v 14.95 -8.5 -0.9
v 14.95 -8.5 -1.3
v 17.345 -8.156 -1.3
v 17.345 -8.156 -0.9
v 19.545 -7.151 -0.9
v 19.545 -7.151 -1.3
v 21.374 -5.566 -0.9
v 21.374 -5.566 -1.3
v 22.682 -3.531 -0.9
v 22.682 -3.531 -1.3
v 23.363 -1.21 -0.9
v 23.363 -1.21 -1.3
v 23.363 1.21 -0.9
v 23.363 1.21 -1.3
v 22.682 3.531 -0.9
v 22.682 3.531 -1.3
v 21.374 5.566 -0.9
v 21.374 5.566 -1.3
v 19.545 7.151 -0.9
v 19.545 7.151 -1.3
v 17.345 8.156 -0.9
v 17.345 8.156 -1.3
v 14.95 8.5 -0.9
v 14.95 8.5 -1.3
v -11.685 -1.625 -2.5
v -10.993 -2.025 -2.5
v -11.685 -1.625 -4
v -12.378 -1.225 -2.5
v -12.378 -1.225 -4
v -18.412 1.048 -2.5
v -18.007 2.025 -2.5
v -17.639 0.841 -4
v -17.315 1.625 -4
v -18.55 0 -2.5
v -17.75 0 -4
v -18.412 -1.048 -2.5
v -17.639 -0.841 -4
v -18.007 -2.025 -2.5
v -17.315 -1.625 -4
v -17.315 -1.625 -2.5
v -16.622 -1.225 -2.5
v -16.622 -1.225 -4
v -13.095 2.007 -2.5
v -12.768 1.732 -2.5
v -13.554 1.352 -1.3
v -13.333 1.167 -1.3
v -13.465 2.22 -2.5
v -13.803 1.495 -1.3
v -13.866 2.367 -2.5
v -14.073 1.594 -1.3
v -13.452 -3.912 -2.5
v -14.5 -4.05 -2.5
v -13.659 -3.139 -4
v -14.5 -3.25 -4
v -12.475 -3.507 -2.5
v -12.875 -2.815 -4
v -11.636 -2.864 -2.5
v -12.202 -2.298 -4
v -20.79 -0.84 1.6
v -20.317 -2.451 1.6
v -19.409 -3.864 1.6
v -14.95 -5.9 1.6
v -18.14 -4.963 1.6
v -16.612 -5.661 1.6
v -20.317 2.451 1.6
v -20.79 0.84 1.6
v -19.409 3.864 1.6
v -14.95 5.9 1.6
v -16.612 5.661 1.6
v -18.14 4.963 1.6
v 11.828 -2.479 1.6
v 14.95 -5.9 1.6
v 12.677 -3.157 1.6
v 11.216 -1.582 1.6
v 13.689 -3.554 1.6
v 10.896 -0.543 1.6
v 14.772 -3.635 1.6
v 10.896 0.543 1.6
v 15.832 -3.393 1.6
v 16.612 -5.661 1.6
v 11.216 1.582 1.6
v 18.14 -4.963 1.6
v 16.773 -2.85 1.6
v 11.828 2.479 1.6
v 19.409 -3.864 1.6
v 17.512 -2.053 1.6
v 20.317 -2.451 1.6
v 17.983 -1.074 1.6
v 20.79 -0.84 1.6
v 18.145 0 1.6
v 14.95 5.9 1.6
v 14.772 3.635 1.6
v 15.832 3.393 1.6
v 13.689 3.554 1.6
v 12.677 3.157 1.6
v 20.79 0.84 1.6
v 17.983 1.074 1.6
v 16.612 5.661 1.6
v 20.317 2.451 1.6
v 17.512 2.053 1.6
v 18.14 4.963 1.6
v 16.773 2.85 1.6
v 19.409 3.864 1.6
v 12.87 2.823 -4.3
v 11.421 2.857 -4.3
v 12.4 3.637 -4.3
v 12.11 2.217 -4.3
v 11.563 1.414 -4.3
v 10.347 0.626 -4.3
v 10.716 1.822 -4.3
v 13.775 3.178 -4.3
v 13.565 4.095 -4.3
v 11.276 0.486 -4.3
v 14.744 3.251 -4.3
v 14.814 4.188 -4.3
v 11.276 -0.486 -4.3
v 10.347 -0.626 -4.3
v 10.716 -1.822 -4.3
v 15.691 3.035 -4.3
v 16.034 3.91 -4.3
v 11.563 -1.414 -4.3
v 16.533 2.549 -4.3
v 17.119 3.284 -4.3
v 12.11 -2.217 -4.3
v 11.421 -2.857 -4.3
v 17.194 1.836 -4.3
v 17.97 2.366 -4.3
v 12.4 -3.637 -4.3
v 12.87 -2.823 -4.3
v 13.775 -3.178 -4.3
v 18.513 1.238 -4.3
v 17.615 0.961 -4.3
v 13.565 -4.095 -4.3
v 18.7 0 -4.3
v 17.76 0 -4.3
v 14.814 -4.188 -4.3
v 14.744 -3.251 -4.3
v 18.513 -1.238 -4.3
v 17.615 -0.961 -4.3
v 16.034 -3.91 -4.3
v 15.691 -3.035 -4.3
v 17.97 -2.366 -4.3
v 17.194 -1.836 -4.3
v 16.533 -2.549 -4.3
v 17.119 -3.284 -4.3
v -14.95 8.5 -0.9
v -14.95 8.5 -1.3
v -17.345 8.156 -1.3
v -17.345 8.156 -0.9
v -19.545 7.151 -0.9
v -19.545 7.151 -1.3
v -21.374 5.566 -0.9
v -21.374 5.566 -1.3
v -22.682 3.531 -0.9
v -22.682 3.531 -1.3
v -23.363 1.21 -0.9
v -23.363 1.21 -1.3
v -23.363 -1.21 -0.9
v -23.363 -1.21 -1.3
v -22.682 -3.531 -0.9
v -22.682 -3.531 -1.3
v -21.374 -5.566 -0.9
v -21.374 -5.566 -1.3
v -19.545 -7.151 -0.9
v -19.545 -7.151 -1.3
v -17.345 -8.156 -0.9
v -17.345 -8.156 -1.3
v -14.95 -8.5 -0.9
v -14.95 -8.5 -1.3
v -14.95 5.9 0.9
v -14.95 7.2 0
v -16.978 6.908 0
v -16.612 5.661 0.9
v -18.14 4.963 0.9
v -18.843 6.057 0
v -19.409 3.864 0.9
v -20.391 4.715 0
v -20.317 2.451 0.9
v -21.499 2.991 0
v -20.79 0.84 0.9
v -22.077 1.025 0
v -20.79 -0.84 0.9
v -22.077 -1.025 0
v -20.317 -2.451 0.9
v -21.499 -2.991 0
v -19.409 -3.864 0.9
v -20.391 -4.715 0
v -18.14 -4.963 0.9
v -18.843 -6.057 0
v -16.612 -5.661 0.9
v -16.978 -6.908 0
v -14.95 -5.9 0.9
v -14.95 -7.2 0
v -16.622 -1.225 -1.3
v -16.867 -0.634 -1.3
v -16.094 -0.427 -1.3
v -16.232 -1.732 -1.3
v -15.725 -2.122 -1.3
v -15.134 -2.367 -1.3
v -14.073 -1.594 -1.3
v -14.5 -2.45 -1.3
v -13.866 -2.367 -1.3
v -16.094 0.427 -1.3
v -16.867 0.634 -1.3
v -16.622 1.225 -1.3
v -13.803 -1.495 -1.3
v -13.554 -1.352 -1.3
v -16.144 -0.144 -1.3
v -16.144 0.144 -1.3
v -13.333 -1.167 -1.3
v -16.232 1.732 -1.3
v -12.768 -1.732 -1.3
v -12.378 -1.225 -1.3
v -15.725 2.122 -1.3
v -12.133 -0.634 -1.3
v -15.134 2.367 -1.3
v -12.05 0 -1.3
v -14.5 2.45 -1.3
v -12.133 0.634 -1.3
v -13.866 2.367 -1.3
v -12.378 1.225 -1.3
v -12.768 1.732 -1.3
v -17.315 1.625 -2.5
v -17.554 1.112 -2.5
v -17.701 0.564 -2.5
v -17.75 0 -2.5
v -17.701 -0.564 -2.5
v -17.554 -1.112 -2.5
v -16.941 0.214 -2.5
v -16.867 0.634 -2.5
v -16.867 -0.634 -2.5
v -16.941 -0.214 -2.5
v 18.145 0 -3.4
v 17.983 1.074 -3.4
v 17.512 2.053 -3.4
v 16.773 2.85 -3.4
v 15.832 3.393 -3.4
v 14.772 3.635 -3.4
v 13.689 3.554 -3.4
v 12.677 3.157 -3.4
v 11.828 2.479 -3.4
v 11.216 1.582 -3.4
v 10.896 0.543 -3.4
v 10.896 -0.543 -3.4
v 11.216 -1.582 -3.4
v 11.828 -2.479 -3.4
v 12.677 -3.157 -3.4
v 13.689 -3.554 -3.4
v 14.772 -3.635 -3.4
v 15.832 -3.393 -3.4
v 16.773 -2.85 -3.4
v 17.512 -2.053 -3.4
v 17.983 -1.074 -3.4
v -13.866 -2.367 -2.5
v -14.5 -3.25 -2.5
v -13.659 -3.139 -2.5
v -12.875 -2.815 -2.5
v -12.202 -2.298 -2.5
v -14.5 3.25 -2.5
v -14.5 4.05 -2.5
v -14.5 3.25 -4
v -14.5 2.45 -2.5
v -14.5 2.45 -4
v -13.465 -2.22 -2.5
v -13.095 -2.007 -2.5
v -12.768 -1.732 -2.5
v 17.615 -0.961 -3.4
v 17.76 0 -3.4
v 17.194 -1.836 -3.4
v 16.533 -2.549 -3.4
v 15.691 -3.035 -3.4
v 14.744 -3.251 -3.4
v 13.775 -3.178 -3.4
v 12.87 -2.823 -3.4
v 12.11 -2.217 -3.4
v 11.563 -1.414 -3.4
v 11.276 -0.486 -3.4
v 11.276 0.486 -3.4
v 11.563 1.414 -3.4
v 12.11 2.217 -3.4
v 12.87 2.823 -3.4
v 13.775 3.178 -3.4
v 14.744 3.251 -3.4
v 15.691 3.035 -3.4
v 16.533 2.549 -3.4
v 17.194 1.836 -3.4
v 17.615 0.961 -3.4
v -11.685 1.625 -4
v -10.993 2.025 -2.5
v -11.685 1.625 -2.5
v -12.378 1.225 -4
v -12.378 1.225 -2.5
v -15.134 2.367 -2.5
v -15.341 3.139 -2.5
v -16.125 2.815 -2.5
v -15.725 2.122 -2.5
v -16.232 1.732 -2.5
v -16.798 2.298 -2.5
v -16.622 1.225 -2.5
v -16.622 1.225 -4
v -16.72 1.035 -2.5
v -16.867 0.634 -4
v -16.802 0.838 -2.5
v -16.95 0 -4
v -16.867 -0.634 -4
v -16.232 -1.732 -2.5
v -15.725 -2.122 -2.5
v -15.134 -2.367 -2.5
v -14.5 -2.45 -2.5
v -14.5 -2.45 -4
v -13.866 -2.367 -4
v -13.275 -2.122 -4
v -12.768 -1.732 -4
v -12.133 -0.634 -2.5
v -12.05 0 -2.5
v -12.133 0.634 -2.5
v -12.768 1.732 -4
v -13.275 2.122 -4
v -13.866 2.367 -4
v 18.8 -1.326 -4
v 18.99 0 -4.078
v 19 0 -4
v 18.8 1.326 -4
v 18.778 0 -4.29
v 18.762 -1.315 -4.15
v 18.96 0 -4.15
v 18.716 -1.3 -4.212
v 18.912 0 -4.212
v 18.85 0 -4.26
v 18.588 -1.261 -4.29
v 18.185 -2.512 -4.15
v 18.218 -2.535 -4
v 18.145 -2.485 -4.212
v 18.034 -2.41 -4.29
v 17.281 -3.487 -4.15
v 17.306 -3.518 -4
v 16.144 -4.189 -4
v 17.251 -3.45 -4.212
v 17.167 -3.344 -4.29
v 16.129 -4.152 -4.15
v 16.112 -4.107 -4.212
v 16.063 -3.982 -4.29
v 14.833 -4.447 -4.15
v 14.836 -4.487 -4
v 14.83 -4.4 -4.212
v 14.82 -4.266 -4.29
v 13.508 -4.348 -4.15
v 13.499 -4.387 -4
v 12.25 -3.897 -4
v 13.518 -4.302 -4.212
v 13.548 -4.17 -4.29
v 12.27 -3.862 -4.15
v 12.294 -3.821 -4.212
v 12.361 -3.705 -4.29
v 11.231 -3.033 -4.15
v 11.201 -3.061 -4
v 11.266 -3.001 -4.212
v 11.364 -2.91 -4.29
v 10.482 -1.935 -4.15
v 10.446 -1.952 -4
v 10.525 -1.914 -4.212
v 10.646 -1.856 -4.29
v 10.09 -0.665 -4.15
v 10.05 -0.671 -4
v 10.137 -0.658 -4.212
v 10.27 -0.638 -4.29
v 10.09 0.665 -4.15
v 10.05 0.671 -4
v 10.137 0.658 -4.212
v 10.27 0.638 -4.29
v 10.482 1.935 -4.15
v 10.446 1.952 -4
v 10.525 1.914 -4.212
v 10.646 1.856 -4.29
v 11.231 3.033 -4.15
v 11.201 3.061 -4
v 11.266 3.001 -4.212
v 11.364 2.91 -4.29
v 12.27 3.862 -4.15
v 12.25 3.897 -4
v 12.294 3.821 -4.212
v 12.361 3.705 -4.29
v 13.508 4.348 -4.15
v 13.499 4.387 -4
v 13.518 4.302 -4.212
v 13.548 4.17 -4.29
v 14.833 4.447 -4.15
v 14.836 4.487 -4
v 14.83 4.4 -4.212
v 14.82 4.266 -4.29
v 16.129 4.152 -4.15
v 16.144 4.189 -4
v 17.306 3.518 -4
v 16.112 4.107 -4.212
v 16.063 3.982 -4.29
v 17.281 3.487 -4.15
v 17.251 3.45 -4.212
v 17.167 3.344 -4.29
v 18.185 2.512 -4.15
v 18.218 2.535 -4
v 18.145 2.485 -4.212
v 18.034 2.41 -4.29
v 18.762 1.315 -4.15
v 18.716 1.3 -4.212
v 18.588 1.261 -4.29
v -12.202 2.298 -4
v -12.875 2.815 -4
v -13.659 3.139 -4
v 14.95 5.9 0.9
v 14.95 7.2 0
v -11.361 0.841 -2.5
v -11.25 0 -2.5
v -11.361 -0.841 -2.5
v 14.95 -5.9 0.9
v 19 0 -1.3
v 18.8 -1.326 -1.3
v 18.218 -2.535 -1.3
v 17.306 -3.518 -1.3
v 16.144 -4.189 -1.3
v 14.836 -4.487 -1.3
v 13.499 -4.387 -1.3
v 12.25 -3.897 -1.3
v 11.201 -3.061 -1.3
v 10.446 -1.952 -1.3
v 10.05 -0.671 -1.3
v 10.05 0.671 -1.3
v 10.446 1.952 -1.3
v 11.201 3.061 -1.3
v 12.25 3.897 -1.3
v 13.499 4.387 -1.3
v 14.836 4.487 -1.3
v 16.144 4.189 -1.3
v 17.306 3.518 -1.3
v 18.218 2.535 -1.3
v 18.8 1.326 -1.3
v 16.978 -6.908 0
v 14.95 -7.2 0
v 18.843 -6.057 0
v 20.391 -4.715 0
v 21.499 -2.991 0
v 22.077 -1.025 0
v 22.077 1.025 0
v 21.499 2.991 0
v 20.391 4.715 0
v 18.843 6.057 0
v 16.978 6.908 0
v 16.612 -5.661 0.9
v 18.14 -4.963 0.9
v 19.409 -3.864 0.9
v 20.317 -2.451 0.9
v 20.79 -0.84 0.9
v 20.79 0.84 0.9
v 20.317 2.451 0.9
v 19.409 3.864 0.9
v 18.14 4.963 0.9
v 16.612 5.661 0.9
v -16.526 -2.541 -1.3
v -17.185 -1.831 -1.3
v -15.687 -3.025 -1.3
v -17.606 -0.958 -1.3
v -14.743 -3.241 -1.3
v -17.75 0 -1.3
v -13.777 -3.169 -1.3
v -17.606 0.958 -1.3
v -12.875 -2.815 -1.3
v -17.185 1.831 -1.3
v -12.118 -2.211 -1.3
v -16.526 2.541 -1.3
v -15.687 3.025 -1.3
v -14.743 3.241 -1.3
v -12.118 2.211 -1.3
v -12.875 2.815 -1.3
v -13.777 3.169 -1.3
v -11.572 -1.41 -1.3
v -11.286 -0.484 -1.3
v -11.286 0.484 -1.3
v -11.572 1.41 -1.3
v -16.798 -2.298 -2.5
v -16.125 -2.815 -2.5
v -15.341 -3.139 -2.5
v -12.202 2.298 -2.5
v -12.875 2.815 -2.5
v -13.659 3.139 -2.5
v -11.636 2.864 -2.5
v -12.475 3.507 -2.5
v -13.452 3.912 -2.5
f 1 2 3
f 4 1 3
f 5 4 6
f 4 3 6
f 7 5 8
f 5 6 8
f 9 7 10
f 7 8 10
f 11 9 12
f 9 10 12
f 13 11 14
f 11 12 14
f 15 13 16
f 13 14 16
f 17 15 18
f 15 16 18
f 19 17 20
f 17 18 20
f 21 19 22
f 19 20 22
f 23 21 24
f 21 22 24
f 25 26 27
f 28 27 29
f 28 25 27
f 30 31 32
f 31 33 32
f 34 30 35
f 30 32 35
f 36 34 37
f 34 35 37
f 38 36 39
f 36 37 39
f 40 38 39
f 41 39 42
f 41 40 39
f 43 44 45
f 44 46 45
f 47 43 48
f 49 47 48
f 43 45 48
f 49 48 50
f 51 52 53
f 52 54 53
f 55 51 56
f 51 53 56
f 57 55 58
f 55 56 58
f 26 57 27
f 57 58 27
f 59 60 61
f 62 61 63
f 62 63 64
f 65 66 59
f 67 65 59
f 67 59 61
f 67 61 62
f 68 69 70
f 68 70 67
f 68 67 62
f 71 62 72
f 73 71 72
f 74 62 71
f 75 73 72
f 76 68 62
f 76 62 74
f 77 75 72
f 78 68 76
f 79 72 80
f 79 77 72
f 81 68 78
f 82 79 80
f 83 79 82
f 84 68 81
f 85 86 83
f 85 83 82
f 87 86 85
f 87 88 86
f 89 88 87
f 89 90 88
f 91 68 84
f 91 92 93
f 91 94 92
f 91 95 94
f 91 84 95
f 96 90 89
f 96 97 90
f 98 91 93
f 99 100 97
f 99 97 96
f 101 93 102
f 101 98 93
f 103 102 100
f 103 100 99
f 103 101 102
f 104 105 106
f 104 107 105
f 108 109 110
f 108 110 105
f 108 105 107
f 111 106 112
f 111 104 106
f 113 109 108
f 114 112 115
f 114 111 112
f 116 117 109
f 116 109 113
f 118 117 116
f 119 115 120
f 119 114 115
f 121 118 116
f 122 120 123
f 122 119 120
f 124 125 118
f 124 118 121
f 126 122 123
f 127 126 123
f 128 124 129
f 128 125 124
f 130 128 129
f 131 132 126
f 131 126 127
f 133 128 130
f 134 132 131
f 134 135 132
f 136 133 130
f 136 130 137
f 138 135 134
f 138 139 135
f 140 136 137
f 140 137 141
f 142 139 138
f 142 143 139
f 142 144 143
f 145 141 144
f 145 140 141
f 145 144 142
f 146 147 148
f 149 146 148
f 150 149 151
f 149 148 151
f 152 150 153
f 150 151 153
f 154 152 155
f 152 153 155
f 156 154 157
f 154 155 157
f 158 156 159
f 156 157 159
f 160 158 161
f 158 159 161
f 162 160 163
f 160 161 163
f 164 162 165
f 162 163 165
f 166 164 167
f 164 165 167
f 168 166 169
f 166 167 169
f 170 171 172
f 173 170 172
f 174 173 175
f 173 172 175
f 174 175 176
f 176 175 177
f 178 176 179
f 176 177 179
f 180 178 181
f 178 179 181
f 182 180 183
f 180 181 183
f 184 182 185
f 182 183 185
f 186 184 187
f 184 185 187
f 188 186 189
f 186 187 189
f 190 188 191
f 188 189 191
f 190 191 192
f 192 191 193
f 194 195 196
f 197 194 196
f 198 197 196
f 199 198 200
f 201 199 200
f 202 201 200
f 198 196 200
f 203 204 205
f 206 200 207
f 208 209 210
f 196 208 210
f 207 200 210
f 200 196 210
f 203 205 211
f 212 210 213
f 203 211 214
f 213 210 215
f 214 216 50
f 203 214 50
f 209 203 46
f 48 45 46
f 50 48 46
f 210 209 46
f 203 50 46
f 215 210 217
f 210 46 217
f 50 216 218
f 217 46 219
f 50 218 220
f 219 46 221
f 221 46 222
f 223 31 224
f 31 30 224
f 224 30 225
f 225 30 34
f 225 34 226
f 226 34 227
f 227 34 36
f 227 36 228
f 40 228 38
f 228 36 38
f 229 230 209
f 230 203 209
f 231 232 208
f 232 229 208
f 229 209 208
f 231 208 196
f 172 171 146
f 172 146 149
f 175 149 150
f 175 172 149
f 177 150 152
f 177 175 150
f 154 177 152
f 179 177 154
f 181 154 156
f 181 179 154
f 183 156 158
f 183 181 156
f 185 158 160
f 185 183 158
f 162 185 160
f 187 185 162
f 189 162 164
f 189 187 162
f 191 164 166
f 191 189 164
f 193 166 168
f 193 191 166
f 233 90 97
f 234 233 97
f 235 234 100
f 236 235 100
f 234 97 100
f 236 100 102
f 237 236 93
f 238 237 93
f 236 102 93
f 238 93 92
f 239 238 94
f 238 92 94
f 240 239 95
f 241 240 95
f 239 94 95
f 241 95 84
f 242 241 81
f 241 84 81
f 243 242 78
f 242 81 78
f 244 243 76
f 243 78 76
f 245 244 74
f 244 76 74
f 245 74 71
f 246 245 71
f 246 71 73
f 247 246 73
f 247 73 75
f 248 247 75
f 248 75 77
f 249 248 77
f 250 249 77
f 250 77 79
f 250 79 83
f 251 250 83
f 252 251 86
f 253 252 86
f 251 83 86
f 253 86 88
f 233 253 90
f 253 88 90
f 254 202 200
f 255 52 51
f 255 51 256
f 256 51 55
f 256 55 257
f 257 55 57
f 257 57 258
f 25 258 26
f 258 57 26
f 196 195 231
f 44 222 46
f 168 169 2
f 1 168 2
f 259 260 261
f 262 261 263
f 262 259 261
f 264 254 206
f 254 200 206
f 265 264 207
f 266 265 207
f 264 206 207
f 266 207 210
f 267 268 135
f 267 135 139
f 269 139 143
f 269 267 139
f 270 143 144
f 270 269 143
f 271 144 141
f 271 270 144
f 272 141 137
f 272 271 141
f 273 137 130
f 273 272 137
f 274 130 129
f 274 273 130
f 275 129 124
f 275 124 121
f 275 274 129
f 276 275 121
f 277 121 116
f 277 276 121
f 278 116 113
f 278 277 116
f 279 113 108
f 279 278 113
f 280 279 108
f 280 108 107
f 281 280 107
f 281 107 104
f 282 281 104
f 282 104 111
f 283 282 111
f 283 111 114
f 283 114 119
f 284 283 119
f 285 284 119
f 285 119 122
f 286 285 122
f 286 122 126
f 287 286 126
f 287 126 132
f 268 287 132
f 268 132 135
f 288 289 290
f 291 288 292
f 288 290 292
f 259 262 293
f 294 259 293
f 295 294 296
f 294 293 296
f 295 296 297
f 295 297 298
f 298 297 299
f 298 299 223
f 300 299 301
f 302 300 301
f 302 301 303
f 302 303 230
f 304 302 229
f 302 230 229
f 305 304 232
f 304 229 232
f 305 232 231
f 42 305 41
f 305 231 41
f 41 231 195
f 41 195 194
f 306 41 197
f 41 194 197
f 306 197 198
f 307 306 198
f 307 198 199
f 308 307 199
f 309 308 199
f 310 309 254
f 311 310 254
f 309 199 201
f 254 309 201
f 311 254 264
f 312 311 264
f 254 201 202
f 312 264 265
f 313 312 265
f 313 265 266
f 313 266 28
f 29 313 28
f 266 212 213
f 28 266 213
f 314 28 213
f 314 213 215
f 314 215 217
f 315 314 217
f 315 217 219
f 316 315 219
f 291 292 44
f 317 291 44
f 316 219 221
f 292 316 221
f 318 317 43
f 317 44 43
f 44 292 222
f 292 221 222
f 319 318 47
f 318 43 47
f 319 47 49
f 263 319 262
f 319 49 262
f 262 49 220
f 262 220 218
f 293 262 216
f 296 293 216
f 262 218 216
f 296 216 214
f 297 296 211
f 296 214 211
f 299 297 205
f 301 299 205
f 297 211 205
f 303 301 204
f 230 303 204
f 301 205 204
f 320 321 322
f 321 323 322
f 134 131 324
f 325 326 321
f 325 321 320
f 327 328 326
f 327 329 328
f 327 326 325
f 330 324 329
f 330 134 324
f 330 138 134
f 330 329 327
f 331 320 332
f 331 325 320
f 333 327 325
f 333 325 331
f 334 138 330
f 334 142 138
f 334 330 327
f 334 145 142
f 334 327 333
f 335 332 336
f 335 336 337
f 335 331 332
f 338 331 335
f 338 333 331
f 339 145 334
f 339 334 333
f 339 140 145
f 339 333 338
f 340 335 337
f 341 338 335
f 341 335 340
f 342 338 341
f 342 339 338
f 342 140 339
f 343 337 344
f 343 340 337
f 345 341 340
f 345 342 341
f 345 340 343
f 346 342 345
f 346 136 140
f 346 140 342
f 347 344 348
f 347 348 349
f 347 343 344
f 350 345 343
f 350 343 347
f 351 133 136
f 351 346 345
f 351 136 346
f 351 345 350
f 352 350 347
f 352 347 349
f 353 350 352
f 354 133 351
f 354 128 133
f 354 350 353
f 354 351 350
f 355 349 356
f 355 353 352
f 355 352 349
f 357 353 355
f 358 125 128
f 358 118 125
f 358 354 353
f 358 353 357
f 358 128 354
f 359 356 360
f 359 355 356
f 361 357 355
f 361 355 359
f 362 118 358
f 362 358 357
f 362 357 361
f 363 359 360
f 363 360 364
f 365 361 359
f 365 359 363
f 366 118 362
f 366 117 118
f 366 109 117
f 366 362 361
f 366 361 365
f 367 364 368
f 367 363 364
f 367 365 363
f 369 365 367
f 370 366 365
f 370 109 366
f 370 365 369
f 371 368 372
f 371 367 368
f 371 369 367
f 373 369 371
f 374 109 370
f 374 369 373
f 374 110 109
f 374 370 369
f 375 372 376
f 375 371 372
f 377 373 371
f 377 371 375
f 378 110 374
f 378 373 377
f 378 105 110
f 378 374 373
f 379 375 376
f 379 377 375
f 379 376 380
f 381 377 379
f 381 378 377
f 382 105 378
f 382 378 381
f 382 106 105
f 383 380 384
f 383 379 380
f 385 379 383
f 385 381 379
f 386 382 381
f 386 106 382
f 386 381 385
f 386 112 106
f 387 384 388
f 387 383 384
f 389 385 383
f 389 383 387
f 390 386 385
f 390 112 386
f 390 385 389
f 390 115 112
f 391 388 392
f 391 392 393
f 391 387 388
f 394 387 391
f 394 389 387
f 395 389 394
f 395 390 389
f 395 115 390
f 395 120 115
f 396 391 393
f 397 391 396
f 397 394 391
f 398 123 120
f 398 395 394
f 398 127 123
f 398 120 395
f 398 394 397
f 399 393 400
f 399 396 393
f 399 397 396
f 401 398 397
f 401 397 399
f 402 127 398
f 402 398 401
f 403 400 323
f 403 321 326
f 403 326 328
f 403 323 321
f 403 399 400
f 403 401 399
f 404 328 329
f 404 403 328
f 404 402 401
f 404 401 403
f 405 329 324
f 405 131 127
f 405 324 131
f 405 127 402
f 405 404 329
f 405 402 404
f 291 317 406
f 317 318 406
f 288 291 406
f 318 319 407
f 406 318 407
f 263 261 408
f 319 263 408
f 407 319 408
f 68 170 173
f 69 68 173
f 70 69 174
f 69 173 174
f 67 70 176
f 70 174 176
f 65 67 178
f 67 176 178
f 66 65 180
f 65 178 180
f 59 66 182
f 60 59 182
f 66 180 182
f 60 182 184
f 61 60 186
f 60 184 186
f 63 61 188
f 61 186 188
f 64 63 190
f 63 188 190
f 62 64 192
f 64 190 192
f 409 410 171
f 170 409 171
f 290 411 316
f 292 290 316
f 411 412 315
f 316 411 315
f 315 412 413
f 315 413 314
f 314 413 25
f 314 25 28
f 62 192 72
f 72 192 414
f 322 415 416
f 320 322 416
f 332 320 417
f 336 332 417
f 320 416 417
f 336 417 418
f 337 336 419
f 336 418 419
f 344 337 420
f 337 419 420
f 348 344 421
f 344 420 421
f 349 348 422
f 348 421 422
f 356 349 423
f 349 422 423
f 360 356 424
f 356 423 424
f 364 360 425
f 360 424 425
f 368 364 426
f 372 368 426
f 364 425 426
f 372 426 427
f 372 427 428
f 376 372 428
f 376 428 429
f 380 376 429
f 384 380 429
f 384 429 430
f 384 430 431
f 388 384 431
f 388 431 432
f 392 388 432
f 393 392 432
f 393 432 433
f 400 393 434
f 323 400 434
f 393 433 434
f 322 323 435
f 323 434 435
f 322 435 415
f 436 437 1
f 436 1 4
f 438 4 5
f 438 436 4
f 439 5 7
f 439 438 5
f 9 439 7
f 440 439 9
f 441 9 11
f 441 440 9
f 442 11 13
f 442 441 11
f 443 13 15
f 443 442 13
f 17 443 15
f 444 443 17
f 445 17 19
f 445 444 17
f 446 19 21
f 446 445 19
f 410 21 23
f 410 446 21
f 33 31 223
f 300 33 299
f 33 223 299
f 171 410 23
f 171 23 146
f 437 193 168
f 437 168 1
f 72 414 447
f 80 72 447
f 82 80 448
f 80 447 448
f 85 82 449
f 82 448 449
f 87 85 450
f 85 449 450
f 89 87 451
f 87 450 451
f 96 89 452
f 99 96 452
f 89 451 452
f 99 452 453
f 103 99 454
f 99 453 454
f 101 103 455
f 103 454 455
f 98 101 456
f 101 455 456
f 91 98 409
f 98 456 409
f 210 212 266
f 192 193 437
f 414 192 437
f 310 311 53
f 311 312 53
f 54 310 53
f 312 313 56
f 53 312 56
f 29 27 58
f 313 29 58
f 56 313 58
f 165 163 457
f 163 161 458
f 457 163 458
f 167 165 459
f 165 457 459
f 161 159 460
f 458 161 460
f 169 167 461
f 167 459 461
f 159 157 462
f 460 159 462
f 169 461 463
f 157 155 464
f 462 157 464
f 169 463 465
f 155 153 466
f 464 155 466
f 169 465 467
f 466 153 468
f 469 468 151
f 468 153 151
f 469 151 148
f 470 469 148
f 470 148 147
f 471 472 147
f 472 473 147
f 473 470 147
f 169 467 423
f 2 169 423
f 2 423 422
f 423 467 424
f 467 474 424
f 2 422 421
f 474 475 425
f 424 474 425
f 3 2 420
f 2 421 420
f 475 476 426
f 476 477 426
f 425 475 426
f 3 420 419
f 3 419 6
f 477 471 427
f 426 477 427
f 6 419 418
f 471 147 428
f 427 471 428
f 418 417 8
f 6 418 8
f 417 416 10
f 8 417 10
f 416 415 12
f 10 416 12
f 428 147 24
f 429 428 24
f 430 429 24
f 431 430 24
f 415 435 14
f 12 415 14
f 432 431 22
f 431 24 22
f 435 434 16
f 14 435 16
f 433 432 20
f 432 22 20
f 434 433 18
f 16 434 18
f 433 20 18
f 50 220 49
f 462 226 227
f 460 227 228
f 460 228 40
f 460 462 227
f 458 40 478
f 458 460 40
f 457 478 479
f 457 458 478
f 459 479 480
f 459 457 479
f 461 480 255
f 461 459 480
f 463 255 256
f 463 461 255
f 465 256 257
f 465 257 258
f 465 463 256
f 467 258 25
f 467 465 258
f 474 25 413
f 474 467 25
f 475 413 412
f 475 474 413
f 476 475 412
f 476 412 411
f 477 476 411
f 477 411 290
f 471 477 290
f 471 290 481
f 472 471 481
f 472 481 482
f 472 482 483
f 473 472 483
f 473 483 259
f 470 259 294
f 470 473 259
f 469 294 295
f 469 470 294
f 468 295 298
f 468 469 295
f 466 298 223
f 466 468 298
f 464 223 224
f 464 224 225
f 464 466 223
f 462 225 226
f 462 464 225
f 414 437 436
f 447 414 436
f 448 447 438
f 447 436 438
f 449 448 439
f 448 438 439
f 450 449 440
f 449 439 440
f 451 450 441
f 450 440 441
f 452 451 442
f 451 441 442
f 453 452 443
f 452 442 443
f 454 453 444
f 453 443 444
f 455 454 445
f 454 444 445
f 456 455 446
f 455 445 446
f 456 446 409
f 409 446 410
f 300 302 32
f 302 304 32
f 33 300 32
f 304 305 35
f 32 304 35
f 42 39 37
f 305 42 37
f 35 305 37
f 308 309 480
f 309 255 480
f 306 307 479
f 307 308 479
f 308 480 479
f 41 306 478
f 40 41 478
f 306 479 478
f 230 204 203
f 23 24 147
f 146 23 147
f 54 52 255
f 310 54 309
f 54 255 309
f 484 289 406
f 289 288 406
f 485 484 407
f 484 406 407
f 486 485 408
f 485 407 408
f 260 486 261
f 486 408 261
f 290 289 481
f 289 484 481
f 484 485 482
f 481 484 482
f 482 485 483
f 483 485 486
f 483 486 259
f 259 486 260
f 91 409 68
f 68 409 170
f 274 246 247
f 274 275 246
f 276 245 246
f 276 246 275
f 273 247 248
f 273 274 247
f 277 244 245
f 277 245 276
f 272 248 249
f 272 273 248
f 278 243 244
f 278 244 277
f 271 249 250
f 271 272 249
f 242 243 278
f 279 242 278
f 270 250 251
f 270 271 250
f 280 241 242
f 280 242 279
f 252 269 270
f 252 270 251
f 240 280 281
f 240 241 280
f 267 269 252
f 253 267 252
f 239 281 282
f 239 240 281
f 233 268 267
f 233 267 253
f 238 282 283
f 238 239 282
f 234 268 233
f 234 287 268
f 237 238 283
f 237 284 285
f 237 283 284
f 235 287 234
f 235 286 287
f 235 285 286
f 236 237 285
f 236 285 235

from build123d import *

# Parameters (mm, degrees)
F1_DEPTH         = 1.6
F4_DEPTH         = 1.3
F5_SIZE2         = 1.3
F5_SIZE          = 0.9
F5_2_SIZE2       = 1.29999
F5_2_SIZE        = 0.89999
F6_R             = 4.5
F6_R_2           = 3.26
F7_DEPTH         = 3
F8_DEPTH         = 2.901
F9_R             = 3.645
F9_R_2           = 3.26
F10_DEPTH        = 5
F11_W            = 0.8
F11_H            = 1.2
F13_ANGLE_BACK   = 30
F13_ANGLE        = 60
F13_COPIES_COUNT = 3
F14_ANGLE_BACK   = 15
F14_ANGLE        = 30
F14_COPIES_COUNT = 3
F15_R            = 0.3


# Not quite as in the source:
# - a fillet or chamfer is up to 0.001 mm smaller than in the source, because OpenCascade refuses the exact size
# - after a boolean that leaves OpenCascade's solid faulty, fix() repairs it
# - a pattern or mirror of a feature is missing from the dataset's text; its kind, count and spacing are read off the source's solid


with BuildPart() as f1:
    # F0 (on Top) → F1 (new body)
    with BuildSketch(Plane.XY):
        with BuildLine():
            Line((14.95, 5.9), (-14.95, 5.9))
            ThreePointArc((-14.95, 5.9), (-20.85, 0), (-14.95, -5.9))
            Line((-14.95, -5.9), (14.95, -5.9))
            ThreePointArc((14.95, -5.9), (20.85, 0), (14.95, 5.9))
        make_face()
    extrude(amount=F1_DEPTH)

    # F3 (on offset) → F4 (join)
    with BuildSketch(Plane.XY.offset(-1.3)):
        with BuildLine():
            Line((14.95, 8.5), (-14.95, 8.5))
            ThreePointArc((-14.95, 8.5), (-23.45, 0), (-14.95, -8.5))
            Line((-14.95, -8.5), (14.95, -8.5))
            ThreePointArc((14.95, -8.5), (23.45, 0), (14.95, 8.5))
        make_face()
    extrude(amount=F4_DEPTH)

    # F5
    f5_edges = [f1.edges().sort_by_distance(p)[0] for p in [
        (0, 8.5, 0),
    ]]
    f5_side = f1.faces().sort_by_distance((0, 8.5, -0.65))[0]
    chamfer(f5_edges, length=F5_SIZE, length2=F5_SIZE2, reference=f5_side)

    # F5#2 (size 0.9 and 1.3 in the source; OpenCascade refuses exactly that, so slightly less here)
    f5_2_edges = [f1.edges().sort_by_distance(p)[0] for p in [
        (0, -5.9, 0),
    ]]
    f5_2_side = f1.faces().sort_by_distance((0, -5.9, 0.8))[0]
    chamfer(f5_2_edges, length=F5_2_SIZE, length2=F5_2_SIZE2, reference=f5_2_side)

    # F6 (on face) → F7 (join)
    with BuildSketch(Plane(origin=(0, 0, -1.3), x_dir=(1, 0, 0), z_dir=(0, 0, -1))):
        with Locations((14.5, 0)):
            Circle(F6_R)
        with Locations((14.5, 0)):
            Circle(F6_R_2, mode=Mode.SUBTRACT)
    extrude(amount=F7_DEPTH)

    # F8 (cut, through all): a face of the model
    f8_faces = [f1.faces().sort_by_distance(p)[0] for p in [
        (14.5, 0, -1.3),
    ]]
    extrude(f8_faces, amount=-F8_DEPTH, mode=Mode.SUBTRACT)

    # F9 (on face) → F10 (cut)
    with BuildSketch(Plane.XY.offset(1.6)):
        with Locations((14.5, 0)):
            Circle(F9_R)
        with Locations((14.5, 0)):
            Circle(F9_R_2, mode=Mode.SUBTRACT)
    extrude(amount=-F10_DEPTH, mode=Mode.SUBTRACT)

    # F11 (on Front) → F12 (revolve)
    with BuildSketch(Plane.XZ):
        with Locations((-17.35, -1.9)):
            Rectangle(F11_W, F11_H)
    revolve(axis=Axis((-14.5, 0, 1.6), (0, 0, 1)))

    # F11 (on Front) → F13 (revolve)
    with BuildSketch(Plane.XZ, mode=Mode.PRIVATE) as f13_sk:
        Polygon((-16.95, -4), (-16.95, -2.5), (-17.75, -2.5), (-18.55, -2.5), (-17.75, -4), align=None)
    f13 = revolve(f13_sk.sketch.rotate(Axis((-14.5, 0, 1.6), (0, 0, 1)), -F13_ANGLE_BACK), axis=Axis((-14.5, 0, 1.6), (0, 0, 1)), revolution_arc=F13_ANGLE)

    # F13_copies: F13 ×3 about axis
    f13_copies_axis = Axis((-14.5, 0, 0), (0, 0, 1))
    for i in range(1, F13_COPIES_COUNT):
        add(f13.rotate(f13_copies_axis, i * 360 / F13_COPIES_COUNT))

    # F11 (on Front) → F14 (revolve)
    with BuildSketch(Plane.XZ, mode=Mode.PRIVATE) as f14_sk:
        Polygon((-16.15, -1.3), (-16.95, -1.3), (-16.95, -2.5), align=None)
    f14 = revolve(f14_sk.sketch.rotate(Axis((-14.5, 0, 1.6), (0, 0, 1)), -F14_ANGLE_BACK), axis=Axis((-14.5, 0, 1.6), (0, 0, 1)), revolution_arc=F14_ANGLE)

    # F14_copies: F14 ×3 about axis
    f14_copies_axis = Axis((-14.5, 0, 0), (0, 0, 1))
    for i in range(1, F14_COPIES_COUNT):
        add(f14.rotate(f14_copies_axis, i * 360 / F14_COPIES_COUNT))

    add(f1.part.fix(), mode=Mode.REPLACE)

    # F15
    f15_edges = [f1.edges().sort_by_distance(p)[0] for p in [
        (10, 0, -4.3),
    ]]
    fillet(f15_edges, radius=F15_R)


solid = f1.part
